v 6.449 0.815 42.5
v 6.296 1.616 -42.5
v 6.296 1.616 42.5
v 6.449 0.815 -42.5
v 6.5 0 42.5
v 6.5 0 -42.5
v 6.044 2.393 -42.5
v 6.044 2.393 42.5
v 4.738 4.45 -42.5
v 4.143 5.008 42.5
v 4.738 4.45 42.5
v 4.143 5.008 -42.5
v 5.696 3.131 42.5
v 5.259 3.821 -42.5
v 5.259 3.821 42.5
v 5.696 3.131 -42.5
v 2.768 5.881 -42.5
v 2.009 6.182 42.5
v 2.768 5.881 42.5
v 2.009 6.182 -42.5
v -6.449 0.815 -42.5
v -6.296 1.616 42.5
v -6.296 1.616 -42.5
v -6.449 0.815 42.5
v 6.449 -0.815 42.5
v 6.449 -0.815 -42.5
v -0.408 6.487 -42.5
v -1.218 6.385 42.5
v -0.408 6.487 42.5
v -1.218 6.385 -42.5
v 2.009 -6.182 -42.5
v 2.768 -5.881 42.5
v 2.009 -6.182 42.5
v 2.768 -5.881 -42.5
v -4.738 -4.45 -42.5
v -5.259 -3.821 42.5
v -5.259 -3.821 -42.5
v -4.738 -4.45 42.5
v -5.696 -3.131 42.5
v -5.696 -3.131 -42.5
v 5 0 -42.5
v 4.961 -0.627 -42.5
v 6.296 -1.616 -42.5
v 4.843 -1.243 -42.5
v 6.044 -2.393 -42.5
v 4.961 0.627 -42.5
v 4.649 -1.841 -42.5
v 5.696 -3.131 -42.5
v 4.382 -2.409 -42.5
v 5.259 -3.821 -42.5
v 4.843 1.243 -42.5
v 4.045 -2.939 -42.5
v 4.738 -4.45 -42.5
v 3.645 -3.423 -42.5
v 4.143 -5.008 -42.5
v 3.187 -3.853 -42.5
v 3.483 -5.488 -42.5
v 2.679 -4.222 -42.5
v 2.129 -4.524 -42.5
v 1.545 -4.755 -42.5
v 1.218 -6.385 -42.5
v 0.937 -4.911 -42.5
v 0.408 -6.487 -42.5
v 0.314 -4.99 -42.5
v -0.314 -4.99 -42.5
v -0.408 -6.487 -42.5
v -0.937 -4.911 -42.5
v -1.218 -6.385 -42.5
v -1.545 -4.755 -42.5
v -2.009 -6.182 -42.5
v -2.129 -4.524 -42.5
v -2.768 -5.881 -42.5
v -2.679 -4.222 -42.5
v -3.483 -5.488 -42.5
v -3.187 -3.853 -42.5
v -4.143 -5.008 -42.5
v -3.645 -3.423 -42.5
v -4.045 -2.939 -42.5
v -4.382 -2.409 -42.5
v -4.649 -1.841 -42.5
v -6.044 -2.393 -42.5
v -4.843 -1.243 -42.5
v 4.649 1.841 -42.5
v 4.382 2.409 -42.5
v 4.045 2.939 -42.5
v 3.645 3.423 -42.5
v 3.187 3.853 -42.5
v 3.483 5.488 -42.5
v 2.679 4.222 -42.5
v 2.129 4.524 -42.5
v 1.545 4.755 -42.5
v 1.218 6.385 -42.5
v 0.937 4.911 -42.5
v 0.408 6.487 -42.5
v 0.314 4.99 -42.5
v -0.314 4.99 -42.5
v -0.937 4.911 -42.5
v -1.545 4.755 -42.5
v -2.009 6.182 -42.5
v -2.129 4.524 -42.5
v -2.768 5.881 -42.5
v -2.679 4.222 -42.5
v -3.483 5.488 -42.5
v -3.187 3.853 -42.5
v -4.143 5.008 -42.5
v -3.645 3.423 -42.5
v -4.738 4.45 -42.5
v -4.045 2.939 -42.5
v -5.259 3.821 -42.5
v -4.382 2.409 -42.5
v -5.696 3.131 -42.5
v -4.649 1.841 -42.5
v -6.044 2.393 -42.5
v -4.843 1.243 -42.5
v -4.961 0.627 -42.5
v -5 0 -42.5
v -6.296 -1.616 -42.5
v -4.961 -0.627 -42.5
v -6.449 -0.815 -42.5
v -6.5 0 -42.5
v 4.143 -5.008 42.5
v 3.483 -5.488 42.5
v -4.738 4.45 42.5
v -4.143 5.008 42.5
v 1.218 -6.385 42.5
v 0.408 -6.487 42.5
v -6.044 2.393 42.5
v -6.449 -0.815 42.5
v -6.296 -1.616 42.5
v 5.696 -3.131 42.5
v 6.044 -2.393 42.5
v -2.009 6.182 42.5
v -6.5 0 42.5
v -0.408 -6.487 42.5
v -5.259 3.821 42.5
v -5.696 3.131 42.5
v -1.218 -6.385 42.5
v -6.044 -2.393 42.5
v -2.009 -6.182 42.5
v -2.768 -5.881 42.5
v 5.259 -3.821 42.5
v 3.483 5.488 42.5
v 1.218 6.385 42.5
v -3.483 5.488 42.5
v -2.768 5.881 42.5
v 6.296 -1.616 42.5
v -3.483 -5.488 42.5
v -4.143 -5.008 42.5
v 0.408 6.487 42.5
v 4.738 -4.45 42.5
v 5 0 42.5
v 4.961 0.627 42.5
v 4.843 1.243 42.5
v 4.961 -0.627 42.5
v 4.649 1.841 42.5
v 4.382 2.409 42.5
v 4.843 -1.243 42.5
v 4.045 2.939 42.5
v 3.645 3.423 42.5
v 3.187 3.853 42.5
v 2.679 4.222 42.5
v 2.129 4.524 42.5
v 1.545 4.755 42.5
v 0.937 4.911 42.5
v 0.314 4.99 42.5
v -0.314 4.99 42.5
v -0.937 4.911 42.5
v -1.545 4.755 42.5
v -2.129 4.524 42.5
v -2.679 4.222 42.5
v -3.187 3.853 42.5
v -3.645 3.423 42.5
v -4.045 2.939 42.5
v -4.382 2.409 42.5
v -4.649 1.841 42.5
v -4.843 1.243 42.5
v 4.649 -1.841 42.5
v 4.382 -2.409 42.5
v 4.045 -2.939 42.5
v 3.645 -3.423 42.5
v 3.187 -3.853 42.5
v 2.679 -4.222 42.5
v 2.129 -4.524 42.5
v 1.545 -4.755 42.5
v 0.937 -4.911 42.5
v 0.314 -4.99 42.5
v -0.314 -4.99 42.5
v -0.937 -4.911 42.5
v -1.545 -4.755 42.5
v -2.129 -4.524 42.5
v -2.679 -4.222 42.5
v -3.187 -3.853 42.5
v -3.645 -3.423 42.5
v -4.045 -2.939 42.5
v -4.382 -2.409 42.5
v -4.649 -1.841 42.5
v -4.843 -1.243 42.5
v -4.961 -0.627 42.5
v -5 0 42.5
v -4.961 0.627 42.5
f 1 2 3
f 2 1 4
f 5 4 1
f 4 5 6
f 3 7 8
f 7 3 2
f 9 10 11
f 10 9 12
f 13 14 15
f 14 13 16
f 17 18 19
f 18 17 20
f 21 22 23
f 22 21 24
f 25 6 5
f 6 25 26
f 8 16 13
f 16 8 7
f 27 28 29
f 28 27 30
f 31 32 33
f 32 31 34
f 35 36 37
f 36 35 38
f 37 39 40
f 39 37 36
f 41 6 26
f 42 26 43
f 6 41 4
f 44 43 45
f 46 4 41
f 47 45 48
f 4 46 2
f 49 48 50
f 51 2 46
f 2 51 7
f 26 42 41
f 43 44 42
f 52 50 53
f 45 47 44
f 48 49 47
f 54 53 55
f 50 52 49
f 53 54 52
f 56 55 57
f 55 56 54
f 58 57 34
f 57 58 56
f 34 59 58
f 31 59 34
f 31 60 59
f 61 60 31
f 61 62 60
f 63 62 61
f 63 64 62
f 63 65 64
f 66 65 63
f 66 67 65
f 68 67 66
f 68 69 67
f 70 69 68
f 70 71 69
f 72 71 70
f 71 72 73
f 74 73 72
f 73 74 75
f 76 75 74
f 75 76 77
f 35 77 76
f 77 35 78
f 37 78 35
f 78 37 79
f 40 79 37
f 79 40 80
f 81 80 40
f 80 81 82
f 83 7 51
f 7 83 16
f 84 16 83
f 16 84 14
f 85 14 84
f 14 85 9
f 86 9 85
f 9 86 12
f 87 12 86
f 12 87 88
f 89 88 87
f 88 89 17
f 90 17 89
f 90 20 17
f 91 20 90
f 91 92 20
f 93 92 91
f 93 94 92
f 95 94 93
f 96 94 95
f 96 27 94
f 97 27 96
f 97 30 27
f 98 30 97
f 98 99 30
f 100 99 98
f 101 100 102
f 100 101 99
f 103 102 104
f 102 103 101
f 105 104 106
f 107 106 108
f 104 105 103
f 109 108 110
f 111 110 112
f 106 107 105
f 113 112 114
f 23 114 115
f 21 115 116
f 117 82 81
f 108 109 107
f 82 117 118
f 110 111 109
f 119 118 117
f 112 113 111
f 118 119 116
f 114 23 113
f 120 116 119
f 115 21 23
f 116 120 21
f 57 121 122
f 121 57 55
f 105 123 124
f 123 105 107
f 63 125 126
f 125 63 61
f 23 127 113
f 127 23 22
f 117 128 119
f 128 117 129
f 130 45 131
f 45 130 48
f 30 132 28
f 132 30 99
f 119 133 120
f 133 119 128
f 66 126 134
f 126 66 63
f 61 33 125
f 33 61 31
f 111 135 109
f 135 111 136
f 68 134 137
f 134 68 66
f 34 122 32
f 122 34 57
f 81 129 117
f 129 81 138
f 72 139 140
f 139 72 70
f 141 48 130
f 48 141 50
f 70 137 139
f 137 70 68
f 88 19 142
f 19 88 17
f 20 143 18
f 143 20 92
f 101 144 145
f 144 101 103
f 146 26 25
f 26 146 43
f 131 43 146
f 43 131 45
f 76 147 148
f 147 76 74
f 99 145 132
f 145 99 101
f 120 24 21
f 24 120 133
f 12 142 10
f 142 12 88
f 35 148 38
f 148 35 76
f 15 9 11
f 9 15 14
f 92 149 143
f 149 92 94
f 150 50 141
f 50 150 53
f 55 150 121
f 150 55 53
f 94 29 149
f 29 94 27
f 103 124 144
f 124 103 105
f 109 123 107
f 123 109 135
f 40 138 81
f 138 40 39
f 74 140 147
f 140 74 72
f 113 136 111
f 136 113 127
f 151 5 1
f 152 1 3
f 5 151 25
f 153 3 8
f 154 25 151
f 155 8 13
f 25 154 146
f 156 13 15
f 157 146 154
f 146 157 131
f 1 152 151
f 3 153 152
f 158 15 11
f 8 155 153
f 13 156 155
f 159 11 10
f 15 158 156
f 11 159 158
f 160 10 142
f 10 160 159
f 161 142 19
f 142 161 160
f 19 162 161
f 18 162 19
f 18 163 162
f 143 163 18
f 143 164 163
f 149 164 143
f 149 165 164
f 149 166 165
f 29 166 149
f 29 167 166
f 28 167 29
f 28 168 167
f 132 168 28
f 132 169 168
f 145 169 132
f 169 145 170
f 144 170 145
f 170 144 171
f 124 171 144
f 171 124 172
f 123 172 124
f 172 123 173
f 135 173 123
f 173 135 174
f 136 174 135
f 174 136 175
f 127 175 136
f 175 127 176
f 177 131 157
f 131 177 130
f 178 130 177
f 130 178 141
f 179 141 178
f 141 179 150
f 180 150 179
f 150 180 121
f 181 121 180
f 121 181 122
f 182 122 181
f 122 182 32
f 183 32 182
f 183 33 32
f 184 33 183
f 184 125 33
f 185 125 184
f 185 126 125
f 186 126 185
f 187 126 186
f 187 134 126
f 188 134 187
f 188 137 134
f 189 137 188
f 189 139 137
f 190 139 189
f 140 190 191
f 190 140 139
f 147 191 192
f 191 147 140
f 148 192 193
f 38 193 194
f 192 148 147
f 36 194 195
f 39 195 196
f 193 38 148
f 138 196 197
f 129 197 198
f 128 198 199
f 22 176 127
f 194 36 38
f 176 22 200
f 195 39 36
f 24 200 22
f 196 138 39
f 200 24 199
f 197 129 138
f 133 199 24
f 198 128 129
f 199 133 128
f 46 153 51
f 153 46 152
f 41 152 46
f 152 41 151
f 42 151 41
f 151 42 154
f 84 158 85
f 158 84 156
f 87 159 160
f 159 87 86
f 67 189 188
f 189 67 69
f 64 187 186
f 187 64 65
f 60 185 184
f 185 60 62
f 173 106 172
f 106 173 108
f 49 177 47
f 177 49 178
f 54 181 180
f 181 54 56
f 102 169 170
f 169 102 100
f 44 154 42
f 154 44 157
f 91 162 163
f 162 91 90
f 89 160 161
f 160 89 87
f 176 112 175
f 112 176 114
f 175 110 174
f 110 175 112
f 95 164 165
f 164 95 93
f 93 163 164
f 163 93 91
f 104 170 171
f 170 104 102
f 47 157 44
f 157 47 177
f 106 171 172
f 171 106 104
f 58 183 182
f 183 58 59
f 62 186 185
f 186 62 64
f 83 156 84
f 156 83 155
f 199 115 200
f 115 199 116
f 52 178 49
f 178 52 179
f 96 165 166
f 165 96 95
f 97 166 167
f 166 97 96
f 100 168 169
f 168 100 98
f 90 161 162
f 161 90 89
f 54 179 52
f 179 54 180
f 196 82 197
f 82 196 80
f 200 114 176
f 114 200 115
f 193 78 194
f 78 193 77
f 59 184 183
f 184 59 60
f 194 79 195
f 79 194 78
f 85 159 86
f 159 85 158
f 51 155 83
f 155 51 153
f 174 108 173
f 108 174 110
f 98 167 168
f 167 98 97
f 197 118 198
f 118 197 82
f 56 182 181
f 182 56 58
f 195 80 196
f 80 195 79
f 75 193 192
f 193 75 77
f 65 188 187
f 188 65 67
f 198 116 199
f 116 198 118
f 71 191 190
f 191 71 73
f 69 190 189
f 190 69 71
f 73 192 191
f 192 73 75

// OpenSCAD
$fn = 50;


difference() {
	union() {
		translate(v = [0, 0, -42.5000000000]) {
			cylinder(h = 85, r = 6.5000000000);
		}
	}
	union() {
		translate(v = [0, 0, -100.0000000000]) {
			cylinder(h = 200, r = 5.0000000000);
		}
	}
}
